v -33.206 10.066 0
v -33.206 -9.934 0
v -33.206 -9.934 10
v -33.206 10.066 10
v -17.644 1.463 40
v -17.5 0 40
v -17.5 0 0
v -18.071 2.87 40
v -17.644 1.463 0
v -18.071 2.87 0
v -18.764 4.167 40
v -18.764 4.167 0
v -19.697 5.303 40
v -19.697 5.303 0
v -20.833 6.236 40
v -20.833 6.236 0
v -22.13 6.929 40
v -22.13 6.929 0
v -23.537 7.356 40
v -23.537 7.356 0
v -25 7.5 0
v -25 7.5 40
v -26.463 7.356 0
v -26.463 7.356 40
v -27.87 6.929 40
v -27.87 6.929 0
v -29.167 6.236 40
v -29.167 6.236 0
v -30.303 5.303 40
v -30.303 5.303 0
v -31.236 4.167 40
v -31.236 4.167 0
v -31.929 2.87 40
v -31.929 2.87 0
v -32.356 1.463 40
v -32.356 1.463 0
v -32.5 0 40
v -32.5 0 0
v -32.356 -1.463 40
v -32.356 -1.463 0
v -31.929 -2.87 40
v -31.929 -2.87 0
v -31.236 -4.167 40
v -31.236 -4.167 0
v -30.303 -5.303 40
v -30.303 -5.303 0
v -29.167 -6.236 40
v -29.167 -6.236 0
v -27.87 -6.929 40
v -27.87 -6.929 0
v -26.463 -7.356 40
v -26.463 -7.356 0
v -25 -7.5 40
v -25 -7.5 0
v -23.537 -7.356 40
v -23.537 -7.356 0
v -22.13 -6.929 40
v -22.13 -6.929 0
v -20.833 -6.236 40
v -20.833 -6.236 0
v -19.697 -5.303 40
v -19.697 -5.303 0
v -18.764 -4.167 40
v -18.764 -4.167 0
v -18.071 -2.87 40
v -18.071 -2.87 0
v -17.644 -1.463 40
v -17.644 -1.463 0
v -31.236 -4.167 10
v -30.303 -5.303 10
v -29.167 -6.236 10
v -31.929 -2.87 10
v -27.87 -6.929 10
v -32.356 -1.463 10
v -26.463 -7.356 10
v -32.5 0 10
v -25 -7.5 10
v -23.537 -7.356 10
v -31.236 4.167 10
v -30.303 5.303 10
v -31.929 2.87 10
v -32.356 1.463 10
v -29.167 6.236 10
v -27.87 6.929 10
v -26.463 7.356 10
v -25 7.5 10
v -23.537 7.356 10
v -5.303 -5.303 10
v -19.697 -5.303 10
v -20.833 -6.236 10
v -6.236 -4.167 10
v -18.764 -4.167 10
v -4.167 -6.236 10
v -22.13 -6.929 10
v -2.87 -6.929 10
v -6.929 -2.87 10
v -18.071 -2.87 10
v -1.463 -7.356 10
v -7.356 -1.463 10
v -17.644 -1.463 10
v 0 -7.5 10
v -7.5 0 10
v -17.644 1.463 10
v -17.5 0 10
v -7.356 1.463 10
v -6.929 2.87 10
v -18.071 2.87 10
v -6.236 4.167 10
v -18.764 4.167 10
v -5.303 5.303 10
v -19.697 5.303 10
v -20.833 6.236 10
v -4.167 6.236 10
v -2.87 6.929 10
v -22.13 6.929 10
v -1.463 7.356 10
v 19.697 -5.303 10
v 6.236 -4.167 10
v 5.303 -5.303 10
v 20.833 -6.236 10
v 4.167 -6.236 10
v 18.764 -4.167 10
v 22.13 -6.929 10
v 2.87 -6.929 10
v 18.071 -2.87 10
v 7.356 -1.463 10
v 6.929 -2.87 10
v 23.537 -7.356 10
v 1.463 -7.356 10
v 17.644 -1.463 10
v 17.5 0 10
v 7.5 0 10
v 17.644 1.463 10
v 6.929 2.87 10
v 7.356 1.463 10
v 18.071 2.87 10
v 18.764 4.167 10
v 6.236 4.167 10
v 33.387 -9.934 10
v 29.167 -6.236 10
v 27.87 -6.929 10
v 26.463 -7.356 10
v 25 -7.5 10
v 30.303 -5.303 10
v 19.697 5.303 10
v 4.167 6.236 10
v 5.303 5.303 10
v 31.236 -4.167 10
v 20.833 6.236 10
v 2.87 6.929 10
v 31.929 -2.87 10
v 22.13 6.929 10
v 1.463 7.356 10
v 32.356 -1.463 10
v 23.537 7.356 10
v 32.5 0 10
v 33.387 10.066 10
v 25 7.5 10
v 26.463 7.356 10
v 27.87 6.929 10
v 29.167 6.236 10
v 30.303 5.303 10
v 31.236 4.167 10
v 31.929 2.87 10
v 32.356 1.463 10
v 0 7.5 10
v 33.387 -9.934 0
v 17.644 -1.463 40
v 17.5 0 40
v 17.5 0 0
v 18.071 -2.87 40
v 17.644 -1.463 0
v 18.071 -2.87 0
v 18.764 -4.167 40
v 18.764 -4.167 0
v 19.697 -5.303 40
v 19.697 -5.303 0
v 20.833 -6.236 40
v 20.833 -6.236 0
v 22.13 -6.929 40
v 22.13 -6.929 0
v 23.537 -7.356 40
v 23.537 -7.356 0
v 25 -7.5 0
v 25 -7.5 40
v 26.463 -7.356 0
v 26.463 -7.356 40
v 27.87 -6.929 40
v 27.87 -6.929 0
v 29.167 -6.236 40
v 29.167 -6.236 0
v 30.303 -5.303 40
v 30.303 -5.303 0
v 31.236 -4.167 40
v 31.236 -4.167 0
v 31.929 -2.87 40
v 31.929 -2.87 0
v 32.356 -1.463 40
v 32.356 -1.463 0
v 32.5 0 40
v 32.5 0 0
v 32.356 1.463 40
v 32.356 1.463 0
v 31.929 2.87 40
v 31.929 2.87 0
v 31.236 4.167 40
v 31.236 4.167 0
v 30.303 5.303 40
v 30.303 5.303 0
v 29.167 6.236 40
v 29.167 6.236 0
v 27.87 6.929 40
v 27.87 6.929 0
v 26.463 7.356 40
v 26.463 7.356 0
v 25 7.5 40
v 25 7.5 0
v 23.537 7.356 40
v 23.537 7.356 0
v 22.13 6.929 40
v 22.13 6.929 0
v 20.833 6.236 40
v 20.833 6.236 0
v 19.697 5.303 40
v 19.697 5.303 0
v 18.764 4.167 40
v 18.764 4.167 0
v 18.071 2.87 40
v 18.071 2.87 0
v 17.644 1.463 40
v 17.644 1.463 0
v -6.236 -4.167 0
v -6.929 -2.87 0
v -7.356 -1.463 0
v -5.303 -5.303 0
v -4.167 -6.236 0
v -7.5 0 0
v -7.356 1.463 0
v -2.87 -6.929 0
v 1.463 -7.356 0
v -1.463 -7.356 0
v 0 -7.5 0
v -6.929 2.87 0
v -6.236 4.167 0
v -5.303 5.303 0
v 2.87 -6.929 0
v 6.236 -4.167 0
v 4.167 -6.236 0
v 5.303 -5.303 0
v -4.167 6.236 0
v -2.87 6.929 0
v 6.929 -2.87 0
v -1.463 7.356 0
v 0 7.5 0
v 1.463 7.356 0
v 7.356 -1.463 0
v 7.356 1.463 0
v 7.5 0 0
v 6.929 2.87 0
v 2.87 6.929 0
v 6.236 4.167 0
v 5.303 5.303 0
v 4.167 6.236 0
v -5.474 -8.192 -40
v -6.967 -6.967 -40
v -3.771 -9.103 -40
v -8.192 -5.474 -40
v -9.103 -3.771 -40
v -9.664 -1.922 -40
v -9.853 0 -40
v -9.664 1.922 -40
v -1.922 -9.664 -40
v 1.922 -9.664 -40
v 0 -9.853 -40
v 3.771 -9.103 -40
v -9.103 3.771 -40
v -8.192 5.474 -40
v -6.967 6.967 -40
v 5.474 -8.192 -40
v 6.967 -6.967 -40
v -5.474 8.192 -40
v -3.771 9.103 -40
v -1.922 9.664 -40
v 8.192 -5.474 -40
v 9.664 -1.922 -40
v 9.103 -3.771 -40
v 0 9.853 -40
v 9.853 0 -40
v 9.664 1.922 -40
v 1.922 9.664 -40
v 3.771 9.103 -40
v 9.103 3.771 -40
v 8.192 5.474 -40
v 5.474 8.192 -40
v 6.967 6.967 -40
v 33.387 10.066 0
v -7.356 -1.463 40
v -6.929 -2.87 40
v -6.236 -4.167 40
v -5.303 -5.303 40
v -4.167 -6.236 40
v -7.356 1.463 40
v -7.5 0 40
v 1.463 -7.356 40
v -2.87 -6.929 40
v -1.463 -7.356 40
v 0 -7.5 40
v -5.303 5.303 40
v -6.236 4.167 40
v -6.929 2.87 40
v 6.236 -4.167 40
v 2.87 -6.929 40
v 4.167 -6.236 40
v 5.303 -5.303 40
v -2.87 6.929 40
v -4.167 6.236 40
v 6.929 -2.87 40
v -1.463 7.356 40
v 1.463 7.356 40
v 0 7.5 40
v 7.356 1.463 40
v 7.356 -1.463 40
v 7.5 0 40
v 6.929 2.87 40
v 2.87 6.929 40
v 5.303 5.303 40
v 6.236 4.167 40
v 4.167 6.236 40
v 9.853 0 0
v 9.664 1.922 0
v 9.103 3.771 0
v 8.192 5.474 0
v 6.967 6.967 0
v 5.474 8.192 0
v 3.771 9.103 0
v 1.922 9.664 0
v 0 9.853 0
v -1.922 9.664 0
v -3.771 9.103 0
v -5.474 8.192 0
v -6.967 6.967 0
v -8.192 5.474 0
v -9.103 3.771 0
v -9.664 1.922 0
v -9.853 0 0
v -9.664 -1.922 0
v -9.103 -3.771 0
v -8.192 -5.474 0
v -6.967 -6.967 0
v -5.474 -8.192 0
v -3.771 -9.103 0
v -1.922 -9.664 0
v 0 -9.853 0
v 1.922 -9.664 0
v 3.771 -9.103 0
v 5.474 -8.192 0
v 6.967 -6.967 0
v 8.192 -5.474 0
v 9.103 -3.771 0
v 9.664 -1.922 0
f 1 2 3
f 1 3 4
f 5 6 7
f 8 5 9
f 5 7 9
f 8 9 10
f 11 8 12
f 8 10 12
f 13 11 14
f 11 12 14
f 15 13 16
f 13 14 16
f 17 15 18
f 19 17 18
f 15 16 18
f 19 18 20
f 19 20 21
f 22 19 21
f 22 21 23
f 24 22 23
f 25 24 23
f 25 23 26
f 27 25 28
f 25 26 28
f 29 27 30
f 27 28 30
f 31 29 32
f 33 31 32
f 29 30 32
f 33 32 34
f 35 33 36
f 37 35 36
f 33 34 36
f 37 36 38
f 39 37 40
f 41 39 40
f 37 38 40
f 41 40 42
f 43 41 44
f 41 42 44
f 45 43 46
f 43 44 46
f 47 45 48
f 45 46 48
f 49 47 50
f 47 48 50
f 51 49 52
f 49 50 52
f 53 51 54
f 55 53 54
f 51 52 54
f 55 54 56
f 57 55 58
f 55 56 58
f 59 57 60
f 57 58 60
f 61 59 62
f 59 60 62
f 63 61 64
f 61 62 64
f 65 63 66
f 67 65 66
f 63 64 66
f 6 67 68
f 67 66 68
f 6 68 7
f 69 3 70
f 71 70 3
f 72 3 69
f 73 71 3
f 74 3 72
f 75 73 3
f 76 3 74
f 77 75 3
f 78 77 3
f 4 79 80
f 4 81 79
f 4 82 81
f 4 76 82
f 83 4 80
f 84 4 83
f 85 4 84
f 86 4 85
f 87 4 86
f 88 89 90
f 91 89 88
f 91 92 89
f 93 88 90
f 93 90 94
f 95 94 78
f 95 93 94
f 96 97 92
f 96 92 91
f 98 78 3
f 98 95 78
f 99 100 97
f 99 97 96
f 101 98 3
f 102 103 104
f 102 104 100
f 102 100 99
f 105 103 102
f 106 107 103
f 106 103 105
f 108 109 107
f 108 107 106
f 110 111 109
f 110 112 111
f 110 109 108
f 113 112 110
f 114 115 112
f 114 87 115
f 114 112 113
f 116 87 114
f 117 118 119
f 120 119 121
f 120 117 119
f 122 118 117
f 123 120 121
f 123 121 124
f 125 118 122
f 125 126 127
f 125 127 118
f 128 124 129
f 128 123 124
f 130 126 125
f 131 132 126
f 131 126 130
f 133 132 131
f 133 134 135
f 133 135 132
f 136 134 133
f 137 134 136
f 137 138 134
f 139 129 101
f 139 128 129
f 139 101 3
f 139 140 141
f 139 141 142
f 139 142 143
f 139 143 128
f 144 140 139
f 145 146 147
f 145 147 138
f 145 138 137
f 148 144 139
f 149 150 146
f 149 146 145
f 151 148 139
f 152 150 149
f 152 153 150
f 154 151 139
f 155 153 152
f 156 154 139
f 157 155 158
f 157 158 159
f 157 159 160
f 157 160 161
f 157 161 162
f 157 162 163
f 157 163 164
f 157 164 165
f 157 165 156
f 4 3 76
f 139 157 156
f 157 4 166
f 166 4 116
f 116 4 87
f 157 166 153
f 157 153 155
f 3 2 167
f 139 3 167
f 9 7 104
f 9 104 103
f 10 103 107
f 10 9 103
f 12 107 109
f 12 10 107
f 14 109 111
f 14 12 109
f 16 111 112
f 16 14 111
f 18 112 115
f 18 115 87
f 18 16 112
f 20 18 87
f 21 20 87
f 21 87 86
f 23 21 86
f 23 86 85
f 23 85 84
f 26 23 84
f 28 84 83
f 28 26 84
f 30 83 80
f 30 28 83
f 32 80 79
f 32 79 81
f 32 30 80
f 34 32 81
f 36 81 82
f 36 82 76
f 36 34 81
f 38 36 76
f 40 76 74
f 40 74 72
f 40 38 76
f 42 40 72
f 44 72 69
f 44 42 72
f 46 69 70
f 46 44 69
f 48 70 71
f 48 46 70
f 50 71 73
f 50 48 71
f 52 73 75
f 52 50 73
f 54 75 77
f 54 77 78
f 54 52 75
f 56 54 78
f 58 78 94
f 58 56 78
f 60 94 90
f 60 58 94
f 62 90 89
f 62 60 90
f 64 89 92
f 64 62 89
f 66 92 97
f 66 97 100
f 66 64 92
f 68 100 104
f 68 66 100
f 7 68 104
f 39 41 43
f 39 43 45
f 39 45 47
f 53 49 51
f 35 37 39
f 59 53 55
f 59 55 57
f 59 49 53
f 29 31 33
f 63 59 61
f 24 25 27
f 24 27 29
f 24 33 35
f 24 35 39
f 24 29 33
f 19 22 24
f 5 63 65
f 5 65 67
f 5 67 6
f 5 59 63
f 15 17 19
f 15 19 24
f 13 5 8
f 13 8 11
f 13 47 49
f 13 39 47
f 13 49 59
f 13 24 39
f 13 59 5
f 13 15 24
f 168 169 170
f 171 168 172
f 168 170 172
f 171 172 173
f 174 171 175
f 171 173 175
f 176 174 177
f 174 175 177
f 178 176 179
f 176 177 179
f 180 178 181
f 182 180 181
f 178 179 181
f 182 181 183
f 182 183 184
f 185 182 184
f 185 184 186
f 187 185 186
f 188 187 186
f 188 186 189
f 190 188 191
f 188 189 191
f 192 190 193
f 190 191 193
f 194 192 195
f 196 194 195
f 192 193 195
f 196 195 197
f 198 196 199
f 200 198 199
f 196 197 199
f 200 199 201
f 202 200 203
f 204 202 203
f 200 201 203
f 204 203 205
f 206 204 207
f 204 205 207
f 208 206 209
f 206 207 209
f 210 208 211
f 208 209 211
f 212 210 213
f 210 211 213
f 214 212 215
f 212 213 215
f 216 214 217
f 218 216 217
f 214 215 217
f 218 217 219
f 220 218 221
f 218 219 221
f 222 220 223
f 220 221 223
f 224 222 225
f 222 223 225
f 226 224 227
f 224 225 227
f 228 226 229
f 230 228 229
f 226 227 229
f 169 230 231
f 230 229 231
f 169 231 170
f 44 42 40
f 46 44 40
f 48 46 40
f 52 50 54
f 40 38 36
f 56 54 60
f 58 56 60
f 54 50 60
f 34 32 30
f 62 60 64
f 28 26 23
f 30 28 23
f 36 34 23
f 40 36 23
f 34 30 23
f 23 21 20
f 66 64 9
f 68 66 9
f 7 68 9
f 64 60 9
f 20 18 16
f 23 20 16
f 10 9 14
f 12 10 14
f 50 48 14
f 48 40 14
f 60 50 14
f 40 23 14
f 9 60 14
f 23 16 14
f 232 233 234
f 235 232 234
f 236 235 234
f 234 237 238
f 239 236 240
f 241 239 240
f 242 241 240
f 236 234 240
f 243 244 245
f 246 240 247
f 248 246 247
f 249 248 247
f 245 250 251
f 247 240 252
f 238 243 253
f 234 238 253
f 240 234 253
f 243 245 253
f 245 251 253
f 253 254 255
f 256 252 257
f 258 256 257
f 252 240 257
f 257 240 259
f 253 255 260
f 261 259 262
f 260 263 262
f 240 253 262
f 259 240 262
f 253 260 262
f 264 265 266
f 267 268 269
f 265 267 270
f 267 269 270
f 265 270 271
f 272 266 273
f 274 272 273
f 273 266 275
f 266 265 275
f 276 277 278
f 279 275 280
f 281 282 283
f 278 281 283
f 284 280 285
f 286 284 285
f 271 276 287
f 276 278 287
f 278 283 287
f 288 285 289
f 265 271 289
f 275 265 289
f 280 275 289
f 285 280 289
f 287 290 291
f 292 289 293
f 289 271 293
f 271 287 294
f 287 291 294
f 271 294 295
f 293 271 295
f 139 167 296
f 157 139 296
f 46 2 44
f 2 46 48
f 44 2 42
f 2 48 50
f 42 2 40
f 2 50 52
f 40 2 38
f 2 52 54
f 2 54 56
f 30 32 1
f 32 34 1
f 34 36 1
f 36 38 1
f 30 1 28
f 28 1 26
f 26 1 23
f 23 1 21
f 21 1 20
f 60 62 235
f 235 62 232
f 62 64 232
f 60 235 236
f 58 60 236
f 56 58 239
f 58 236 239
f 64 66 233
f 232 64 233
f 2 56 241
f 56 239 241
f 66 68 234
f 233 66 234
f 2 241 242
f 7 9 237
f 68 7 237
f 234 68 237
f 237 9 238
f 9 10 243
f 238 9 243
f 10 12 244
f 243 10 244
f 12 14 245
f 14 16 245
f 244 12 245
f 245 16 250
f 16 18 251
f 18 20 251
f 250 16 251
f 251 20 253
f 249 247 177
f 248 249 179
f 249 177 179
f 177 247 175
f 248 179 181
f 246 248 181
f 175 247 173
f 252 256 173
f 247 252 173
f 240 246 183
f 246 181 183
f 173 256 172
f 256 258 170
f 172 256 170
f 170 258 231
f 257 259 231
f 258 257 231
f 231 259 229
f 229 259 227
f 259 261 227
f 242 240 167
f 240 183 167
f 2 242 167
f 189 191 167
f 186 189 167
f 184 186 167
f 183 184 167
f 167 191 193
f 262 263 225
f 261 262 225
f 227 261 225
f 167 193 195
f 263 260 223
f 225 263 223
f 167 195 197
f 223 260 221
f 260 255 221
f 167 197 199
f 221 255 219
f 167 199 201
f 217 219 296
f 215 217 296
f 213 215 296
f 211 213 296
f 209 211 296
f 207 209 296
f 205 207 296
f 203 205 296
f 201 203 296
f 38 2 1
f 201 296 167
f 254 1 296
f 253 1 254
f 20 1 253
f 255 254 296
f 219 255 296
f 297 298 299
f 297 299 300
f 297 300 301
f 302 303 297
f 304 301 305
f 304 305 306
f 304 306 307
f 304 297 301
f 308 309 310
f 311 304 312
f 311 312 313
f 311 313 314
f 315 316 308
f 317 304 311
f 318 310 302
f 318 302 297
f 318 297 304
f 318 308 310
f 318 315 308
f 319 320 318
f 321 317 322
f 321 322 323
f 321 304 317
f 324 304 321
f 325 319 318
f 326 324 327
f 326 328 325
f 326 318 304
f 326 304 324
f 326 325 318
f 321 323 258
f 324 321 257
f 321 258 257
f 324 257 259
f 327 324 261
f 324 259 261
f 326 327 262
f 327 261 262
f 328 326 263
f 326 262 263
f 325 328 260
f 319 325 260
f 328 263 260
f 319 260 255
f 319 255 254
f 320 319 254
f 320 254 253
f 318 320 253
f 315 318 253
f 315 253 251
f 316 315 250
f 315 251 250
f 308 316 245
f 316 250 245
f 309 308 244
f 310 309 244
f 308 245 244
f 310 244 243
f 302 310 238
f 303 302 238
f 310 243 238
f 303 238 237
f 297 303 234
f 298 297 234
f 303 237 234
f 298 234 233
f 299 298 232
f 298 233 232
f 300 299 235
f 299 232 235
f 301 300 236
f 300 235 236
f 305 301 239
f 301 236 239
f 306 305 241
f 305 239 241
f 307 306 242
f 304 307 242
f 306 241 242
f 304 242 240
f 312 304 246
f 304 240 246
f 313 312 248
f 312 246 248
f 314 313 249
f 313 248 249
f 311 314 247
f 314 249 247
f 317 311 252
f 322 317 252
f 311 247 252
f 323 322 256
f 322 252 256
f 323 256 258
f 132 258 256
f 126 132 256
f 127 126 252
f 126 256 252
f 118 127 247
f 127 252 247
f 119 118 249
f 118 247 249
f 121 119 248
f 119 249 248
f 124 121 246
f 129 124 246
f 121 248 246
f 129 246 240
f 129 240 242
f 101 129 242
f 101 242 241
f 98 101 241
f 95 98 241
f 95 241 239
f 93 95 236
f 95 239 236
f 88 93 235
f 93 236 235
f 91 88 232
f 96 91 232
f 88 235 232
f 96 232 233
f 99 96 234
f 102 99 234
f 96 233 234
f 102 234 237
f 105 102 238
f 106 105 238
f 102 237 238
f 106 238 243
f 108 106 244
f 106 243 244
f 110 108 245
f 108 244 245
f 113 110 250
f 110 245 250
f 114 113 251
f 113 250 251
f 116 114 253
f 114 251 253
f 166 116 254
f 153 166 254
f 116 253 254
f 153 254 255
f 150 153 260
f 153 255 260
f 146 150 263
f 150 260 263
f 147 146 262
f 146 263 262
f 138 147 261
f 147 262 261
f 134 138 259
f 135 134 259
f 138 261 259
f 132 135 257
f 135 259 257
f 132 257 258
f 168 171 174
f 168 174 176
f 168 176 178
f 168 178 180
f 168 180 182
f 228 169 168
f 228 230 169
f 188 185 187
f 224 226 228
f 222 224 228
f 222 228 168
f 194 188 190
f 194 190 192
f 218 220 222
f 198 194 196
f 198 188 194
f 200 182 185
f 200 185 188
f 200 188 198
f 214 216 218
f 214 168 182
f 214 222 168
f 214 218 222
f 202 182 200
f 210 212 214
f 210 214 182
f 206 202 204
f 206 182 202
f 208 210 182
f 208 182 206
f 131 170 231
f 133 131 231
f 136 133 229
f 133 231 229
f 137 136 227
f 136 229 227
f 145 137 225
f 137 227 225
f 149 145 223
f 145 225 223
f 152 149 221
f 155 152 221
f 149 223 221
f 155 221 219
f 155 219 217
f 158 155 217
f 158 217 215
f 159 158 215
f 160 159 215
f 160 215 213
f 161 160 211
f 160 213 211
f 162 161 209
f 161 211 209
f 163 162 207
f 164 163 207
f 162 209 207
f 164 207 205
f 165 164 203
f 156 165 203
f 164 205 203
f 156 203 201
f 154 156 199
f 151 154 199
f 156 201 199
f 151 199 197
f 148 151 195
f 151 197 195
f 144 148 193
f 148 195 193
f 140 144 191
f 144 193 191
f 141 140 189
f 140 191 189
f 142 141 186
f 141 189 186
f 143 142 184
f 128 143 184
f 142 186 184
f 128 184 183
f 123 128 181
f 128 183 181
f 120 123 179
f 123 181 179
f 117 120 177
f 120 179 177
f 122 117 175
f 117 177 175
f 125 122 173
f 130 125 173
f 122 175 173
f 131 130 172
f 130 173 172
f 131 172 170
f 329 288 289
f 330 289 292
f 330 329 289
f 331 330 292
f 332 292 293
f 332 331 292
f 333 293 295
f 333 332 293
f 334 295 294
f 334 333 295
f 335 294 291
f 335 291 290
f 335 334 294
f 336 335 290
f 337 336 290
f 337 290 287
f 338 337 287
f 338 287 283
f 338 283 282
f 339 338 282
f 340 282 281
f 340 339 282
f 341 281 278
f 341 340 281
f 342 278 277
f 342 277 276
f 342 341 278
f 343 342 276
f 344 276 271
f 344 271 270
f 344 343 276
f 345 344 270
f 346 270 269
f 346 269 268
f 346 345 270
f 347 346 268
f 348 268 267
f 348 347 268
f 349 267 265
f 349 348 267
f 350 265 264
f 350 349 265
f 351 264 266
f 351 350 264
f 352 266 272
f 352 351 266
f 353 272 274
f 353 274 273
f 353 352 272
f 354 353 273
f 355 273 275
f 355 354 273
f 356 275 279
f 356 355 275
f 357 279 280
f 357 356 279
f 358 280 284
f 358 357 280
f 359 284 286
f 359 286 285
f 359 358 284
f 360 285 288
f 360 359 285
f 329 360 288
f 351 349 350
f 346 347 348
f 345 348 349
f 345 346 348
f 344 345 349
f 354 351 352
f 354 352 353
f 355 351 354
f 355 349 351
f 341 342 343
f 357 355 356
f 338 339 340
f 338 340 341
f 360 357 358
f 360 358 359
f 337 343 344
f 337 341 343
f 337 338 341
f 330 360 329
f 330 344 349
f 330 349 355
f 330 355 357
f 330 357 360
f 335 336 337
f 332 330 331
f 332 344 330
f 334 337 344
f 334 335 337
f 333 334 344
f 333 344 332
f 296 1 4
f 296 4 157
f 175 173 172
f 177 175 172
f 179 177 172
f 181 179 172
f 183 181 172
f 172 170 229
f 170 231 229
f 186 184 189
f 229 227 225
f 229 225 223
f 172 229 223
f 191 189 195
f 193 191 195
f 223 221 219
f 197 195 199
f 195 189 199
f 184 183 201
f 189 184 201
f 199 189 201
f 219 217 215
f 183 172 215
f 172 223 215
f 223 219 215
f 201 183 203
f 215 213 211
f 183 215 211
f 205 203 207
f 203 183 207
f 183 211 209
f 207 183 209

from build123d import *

# Parameters (mm, degrees)
F1_DEPTH = 40
F0_R     = 7.5
F0_W     = 66.5927492082
F0_H     = 20
F2_DEPTH = 10
F3_R     = 9.8529460541
F4_DEPTH = 40


with BuildPart() as f1:
    # F0 (on Top) → F1 (new body)
    with BuildSketch(Plane.XY):
        with BuildLine():
            ThreePointArc((-7.5, 0), (0, -7.5), (7.5, 0))
            ThreePointArc((7.5, 0), (0, 7.5), (-7.5, 0))
        make_face()
    extrude(amount=F1_DEPTH)


with BuildPart() as f1b:
    # F0 (on Top) → F1, piece 2 (new body)
    with BuildSketch(Plane.XY):
        with Locations((-25, 0)):
            Circle(F0_R)
    extrude(amount=F1_DEPTH)


with BuildPart() as f1c:
    # F0 (on Top) → F1, piece 3 (new body)
    with BuildSketch(Plane.XY):
        with BuildLine():
            ThreePointArc((32.5, 0), (25, 7.5), (17.5, 0))
            ThreePointArc((17.5, 0), (25, -7.5), (32.5, 0))
        make_face()
    extrude(amount=F1_DEPTH)


with BuildPart() as f2:
    # F0 (on Top) → F2 (new body)
    with BuildSketch(Plane.XY):
        with Locations((0.0907275826, 0.0664947927)):
            Rectangle(F0_W, F0_H)
        with Locations((-25, 0)):
            Circle(F0_R, mode=Mode.SUBTRACT)
        with BuildLine():
            ThreePointArc((-7.5, 0), (0, 7.5), (7.5, 0))
            ThreePointArc((7.5, 0), (0, -7.5), (-7.5, 0))
        make_face(mode=Mode.SUBTRACT)
        with BuildLine():
            ThreePointArc((32.5, 0), (25, -7.5), (17.5, 0))
            ThreePointArc((17.5, 0), (25, 7.5), (32.5, 0))
        make_face(mode=Mode.SUBTRACT)
    extrude(amount=F2_DEPTH)


with BuildPart() as f4:
    # F3 (on Top) → F4 (new body)
    with BuildSketch(Plane.XY):
        Circle(F3_R)
    extrude(amount=-F4_DEPTH)


solid = Compound([f1.part, f1b.part, f1c.part, f2.part, f4.part])
